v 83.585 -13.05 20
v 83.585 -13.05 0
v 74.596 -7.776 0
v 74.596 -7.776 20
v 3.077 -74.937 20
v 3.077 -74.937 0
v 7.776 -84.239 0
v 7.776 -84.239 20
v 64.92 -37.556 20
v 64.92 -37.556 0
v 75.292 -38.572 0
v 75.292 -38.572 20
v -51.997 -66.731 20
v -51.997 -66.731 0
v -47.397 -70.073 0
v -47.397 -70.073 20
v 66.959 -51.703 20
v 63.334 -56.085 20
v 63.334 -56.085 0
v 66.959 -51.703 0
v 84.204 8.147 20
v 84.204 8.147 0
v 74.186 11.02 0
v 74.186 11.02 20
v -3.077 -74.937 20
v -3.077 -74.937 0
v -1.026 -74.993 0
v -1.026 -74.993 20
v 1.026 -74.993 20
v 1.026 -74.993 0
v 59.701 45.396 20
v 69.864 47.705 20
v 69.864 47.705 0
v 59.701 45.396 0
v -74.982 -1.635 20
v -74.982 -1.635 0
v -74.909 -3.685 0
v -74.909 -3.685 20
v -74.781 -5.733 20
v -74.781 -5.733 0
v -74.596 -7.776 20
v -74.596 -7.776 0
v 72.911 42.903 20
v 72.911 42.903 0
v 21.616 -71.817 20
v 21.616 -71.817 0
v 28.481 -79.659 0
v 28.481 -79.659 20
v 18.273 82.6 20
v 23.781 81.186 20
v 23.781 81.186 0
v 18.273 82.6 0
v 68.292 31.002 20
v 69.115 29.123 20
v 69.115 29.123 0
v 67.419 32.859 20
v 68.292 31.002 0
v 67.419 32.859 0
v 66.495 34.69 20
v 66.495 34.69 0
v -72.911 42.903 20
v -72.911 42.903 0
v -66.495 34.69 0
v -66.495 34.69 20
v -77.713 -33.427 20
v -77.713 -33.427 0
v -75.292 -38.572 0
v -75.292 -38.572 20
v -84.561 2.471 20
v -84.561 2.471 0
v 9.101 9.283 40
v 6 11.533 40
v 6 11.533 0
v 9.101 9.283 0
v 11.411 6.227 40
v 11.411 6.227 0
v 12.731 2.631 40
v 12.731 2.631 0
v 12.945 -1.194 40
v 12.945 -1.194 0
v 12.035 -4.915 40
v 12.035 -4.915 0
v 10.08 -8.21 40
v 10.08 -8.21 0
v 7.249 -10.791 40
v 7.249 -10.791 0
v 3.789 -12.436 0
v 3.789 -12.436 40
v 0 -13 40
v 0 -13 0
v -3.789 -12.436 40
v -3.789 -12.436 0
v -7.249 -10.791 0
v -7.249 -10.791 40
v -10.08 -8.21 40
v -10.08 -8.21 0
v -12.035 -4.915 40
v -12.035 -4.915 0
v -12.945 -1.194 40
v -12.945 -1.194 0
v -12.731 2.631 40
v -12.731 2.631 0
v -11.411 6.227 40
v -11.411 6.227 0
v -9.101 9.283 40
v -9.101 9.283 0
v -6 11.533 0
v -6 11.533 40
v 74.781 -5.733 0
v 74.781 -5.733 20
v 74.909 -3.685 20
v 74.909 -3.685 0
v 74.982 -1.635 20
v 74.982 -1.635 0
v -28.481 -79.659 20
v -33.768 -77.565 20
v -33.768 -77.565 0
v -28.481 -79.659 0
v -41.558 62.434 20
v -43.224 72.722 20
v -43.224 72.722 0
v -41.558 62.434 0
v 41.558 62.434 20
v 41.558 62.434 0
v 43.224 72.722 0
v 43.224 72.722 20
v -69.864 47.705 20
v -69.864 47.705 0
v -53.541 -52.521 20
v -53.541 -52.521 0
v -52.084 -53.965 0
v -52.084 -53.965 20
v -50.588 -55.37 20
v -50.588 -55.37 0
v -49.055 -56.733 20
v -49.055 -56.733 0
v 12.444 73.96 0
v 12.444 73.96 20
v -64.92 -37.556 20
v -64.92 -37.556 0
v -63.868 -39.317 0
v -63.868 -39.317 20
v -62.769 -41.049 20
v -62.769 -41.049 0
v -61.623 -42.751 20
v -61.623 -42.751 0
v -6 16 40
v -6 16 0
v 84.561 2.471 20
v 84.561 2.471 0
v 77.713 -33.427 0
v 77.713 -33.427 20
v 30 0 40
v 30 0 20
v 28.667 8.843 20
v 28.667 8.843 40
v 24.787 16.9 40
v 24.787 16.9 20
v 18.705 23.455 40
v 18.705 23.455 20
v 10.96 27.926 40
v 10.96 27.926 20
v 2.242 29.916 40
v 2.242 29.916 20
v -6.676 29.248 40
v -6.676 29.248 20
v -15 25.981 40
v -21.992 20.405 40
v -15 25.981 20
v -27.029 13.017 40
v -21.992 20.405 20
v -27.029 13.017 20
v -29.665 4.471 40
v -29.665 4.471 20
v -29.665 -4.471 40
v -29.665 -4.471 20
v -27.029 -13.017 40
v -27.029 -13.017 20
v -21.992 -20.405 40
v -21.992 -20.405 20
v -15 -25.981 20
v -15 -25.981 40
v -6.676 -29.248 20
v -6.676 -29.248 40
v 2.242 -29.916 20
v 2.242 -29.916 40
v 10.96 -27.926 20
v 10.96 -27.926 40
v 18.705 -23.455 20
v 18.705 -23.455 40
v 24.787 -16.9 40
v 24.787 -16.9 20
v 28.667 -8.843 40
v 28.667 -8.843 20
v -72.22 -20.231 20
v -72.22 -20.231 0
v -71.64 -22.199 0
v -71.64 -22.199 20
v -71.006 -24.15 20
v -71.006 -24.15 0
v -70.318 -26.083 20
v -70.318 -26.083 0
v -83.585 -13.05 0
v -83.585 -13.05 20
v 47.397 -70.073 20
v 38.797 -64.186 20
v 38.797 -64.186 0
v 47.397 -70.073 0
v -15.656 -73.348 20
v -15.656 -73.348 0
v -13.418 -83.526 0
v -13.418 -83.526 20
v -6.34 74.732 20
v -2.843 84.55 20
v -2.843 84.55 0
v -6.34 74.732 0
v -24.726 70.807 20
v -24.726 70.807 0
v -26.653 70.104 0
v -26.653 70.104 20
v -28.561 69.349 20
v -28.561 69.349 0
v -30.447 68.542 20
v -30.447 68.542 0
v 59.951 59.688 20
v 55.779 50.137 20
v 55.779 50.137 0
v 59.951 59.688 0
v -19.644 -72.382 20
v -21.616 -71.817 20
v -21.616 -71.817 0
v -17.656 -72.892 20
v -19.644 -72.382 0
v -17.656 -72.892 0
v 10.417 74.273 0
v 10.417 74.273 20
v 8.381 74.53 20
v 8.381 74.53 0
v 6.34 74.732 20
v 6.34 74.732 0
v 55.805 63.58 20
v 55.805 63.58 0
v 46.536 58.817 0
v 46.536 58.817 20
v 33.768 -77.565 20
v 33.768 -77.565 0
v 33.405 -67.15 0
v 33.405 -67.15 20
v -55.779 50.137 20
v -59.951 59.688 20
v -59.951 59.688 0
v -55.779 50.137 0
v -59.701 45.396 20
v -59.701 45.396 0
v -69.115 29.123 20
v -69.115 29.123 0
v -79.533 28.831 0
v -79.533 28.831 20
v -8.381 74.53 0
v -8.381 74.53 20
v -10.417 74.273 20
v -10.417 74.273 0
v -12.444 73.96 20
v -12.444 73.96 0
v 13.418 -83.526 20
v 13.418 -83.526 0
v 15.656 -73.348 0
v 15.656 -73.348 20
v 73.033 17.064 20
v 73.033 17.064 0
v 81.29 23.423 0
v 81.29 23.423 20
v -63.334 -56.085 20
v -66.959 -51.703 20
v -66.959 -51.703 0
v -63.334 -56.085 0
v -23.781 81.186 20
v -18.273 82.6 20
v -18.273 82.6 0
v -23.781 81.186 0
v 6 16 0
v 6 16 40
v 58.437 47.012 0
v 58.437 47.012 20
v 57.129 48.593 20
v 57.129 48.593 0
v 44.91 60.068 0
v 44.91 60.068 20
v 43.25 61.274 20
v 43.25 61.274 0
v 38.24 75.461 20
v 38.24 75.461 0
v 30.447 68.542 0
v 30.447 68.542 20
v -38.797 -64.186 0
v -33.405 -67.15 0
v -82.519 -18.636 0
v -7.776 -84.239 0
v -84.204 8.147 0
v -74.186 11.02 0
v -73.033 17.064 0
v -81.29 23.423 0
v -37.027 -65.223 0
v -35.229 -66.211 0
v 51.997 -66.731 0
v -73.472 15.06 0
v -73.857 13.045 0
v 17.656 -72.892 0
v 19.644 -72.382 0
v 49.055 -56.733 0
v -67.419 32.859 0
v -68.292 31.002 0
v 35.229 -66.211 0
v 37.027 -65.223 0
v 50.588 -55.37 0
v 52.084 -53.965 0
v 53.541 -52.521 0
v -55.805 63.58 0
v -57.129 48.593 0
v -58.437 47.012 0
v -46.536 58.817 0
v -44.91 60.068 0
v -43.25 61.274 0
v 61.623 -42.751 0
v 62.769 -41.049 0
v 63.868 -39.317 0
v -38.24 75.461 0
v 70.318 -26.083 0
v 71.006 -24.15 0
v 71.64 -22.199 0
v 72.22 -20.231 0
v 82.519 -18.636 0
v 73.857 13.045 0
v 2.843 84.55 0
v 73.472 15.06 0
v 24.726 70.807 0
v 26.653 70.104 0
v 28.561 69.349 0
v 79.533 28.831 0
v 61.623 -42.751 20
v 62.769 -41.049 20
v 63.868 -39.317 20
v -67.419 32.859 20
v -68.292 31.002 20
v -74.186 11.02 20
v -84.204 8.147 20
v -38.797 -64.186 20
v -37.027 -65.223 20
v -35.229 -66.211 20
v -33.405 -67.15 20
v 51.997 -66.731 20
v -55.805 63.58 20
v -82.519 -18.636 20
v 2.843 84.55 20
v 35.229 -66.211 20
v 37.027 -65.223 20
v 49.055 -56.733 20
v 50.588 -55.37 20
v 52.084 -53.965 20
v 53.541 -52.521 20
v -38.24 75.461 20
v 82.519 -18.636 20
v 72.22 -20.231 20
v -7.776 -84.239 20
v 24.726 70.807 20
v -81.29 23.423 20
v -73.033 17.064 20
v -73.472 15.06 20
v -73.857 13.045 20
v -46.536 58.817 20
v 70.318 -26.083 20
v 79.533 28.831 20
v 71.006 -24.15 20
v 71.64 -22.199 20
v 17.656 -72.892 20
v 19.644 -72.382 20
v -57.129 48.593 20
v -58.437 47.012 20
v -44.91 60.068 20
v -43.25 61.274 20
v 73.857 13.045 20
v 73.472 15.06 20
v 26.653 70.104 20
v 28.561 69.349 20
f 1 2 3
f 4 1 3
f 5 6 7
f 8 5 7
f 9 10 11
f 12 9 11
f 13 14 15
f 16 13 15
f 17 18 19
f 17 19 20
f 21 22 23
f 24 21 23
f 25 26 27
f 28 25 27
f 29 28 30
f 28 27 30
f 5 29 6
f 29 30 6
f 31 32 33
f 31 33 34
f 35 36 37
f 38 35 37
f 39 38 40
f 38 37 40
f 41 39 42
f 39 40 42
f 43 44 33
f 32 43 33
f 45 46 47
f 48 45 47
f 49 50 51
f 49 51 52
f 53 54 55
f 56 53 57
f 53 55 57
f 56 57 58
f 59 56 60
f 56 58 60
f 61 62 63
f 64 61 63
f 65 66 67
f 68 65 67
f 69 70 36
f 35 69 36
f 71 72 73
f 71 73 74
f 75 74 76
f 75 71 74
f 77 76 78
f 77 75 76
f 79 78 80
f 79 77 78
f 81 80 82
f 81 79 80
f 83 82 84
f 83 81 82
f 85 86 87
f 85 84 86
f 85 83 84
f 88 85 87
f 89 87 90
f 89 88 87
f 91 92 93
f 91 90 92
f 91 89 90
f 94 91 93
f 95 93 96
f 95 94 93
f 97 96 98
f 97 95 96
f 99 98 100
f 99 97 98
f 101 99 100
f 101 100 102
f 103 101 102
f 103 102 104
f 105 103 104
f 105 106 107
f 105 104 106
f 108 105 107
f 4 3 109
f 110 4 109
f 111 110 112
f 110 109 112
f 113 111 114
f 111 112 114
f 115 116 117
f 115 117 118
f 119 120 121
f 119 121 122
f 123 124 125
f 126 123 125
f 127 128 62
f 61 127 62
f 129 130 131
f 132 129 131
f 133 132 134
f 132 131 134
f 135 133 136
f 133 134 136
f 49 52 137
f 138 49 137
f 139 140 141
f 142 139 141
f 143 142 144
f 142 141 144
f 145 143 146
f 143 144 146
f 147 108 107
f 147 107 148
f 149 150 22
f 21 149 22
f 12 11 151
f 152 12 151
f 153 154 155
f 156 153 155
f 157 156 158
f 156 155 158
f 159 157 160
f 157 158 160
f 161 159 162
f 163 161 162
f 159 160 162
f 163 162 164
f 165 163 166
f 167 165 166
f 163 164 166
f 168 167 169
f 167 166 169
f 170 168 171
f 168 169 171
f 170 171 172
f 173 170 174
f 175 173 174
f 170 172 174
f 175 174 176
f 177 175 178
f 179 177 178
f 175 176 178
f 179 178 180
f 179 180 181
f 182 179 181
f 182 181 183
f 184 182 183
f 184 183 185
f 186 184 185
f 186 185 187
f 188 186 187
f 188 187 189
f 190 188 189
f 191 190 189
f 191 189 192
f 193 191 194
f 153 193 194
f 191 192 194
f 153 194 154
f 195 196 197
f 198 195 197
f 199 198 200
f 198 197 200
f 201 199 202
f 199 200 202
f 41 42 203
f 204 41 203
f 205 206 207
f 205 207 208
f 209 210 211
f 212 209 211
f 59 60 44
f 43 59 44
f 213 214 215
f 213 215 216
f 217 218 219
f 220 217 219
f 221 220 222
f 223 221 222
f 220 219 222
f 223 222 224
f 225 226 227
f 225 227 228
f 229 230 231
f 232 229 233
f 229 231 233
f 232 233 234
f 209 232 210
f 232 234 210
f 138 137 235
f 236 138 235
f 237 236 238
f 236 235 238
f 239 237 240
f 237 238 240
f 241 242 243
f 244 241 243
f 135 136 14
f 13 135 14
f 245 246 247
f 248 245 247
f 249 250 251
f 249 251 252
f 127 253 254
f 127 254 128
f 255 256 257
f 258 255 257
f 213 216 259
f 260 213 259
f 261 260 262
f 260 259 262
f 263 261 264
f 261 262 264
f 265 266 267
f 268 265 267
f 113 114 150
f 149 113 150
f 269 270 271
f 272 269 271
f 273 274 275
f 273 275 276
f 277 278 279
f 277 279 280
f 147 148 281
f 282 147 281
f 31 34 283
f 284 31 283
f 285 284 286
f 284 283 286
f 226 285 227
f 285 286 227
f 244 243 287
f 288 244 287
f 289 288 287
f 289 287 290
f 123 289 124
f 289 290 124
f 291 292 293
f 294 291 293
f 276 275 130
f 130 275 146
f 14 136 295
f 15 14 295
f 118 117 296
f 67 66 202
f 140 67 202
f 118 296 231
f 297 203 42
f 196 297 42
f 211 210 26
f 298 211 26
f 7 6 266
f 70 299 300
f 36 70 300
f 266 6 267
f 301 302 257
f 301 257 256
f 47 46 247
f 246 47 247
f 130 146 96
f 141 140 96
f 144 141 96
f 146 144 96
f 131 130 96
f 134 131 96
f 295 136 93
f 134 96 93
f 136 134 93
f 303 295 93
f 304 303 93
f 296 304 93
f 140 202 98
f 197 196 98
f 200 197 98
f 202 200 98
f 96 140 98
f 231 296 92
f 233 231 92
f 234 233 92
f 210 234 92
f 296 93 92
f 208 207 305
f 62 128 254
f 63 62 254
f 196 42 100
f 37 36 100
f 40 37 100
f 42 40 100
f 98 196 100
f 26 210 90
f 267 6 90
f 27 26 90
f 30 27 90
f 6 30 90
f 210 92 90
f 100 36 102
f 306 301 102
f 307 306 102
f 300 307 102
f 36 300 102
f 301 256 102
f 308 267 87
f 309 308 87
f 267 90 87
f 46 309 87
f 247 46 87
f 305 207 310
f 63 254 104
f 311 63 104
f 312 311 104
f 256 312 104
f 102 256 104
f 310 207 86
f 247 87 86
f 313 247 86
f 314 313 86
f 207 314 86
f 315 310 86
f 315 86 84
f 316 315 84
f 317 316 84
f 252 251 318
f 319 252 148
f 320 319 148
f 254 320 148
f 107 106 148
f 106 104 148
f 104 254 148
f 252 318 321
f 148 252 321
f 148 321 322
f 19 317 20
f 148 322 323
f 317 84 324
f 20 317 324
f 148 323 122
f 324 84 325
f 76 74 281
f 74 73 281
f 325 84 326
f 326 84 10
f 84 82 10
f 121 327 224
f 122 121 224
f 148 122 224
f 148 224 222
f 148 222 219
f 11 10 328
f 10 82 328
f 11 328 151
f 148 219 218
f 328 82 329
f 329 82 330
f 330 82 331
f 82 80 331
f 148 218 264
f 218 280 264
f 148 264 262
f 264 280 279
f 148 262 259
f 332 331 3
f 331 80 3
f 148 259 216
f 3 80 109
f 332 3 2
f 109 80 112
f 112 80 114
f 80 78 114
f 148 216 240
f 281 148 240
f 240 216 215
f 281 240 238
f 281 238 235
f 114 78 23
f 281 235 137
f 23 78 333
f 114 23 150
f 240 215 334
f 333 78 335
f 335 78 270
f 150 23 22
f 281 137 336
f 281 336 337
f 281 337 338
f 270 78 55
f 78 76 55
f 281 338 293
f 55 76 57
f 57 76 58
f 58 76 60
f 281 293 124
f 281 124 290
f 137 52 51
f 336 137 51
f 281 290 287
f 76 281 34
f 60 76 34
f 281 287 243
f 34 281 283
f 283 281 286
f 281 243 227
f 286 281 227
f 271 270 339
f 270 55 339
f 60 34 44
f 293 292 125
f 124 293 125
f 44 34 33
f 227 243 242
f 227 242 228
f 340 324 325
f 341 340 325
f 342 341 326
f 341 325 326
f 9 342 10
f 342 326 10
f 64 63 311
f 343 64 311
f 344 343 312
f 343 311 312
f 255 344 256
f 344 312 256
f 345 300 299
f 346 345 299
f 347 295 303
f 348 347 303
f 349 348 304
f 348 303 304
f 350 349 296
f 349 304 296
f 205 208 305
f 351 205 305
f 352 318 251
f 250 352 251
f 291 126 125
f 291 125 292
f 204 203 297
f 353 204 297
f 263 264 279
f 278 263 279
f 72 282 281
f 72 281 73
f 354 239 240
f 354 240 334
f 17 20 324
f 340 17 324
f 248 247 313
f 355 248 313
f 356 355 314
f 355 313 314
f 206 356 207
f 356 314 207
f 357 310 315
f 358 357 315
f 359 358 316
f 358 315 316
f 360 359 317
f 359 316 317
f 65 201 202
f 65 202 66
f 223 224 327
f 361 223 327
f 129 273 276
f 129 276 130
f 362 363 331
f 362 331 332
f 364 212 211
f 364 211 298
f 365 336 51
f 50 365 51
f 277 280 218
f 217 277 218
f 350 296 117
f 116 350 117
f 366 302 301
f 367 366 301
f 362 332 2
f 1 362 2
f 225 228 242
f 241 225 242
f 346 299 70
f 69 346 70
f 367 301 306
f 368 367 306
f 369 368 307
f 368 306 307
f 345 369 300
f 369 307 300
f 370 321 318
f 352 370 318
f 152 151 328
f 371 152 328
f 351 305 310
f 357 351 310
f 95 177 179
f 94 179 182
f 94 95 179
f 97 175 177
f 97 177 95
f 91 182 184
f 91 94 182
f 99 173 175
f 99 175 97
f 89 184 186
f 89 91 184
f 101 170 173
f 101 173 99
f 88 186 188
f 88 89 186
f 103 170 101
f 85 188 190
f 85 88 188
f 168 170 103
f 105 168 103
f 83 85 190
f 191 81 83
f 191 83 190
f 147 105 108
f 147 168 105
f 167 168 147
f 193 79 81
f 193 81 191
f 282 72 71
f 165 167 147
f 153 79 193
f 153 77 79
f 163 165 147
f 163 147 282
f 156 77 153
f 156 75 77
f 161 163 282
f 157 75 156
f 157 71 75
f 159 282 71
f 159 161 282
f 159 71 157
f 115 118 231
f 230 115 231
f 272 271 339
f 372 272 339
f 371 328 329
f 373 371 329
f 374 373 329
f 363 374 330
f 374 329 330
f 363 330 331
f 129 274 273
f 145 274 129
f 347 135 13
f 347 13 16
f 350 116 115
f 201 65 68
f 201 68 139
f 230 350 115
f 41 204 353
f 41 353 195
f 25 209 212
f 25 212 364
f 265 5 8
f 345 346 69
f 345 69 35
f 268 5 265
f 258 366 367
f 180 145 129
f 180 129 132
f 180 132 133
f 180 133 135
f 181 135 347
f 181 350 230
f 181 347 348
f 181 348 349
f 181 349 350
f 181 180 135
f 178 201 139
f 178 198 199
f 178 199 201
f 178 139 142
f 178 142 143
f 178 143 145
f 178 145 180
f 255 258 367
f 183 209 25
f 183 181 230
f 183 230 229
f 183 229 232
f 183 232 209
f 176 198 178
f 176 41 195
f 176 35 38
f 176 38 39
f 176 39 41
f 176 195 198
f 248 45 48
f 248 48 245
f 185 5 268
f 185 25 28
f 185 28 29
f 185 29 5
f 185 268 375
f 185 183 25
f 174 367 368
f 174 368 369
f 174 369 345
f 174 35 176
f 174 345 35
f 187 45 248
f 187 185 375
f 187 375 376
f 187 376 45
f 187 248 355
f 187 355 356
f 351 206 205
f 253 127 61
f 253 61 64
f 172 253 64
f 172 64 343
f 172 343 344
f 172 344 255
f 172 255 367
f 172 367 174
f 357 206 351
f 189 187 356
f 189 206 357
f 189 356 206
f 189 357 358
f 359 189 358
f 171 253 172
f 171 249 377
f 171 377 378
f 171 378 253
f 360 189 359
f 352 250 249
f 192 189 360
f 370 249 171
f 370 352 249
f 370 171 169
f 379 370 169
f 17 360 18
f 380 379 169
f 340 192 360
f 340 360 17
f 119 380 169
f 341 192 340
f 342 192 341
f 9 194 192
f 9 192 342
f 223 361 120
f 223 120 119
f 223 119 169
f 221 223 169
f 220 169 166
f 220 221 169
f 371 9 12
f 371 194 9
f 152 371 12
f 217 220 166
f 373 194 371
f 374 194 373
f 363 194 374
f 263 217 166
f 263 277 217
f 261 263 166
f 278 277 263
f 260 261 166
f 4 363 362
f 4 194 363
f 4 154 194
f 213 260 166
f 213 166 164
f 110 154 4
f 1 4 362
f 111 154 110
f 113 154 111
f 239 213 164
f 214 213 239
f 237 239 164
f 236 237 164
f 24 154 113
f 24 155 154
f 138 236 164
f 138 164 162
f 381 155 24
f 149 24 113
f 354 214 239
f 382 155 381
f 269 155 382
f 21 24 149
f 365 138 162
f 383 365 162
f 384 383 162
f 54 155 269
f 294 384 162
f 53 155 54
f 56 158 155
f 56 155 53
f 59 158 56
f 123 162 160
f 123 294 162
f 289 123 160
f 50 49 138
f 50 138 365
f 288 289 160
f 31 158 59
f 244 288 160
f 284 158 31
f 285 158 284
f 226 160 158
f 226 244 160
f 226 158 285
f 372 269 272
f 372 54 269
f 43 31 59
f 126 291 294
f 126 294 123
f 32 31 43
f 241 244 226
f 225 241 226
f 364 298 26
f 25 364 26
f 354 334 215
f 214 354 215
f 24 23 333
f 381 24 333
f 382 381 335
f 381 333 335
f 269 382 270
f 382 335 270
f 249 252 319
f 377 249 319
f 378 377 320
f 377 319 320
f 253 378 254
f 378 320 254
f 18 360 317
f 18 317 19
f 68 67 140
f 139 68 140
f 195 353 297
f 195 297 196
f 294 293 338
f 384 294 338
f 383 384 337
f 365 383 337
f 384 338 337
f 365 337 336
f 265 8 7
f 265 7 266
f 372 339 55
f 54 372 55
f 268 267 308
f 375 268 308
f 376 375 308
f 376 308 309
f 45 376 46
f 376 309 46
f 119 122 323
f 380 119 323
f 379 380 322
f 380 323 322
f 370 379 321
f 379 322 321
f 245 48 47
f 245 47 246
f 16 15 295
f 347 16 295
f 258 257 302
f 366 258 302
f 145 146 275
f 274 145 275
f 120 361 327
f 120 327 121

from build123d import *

# Parameters (mm, degrees)
BOSS_EXTRUDE1_DEPTH = 20
SKETCH3_R           = 30
BOSS_EXTRUDE2_DEPTH = 20
CUT_EXTRUDE1_DEPTH  = 127.092159028


with BuildPart() as part:
    # Sketch1 → Boss-Extrude1 (new body)
    with BuildSketch(Plane.XY):
        with BuildLine():
            Line((6.339757092, 74.731569501), (2.843370149, 84.549554706))
            Line((2.843370149, 84.549554706), (-2.843370149, 84.549554706))
            Line((-2.843370149, 84.549554706), (-6.339757092, 74.731569501))
            ThreePointArc((-6.339757092, 74.731569501), (-9.399992517, 74.408602599), (-12.444403622, 73.960373299))
            Line((-12.444403622, 73.960373299), (-18.272578772, 82.600392371))
            Line((-18.272578772, 82.600392371), (-23.780659667, 81.186157568))
            Line((-23.780659667, 81.186157568), (-24.725567552, 70.807106347))
            ThreePointArc((-24.725567552, 70.807106347), (-27.609341451, 69.733236442), (-30.446636689, 68.541974836))
            Line((-30.446636689, 68.541974836), (-38.240394368, 75.4611436))
            Line((-38.240394368, 75.4611436), (-43.223722879, 72.721535567))
            Line((-43.223722879, 72.721535567), (-41.557779668, 62.433572291))
            ThreePointArc((-41.557779668, 62.433572291), (-44.083893922, 60.676274578), (-46.535795597, 58.816832014))
            Line((-46.535795597, 58.816832014), (-55.805425347, 63.58039365))
            Line((-55.805425347, 63.58039365), (-59.950880617, 59.687552036))
            Line((-59.950880617, 59.687552036), (-55.778763649, 50.137107274))
            ThreePointArc((-55.778763649, 50.137107274), (-57.788493208, 47.806799231), (-59.700939322, 45.396011323))
            Line((-59.700939322, 45.396011323), (-69.863996213, 47.704653735))
            Line((-69.863996213, 47.704653735), (-72.911104041, 42.903180095))
            Line((-72.911104041, 42.903180095), (-66.49496277, 34.690343415))
            ThreePointArc((-66.49496277, 34.690343415), (-67.862028935, 31.933446867), (-69.114853465, 29.122792286))
            Line((-69.114853465, 29.122792286), (-79.532755256, 28.83145498))
            Line((-79.532755256, 28.83145498), (-81.290054651, 23.423043562))
            Line((-81.290054651, 23.423043562), (-73.033038828, 17.063857698))
            ThreePointArc((-73.033038828, 17.063857698), (-73.671543805, 14.053598594), (-74.186027177, 11.019681104))
            Line((-74.186027177, 11.019681104), (-84.204178785, 8.146669874))
            Line((-84.204178785, 8.146669874), (-84.561252162, 2.471151058))
            Line((-84.561252162, 2.471151058), (-74.98218046, -1.634812956))
            ThreePointArc((-74.98218046, -1.634812956), (-74.852004632, -4.709288965), (-74.595819965, -7.77583717))
            Line((-74.595819965, -7.77583717), (-83.584744079, -13.050000462))
            Line((-83.584744079, -13.050000462), (-82.519155206, -18.636012955))
            Line((-82.519155206, -18.636012955), (-72.219915929, -20.230762298))
            ThreePointArc((-72.219915929, -20.230762298), (-71.329238722, -23.176274578), (-70.318483041, -26.082770996))
            Line((-70.318483041, -26.082770996), (-77.7133725, -33.426691274))
            Line((-77.7133725, -33.426691274), (-75.292076244, -38.572207736))
            Line((-75.292076244, -38.572207736), (-64.919808474, -37.555538443))
            ThreePointArc((-64.919808474, -37.555538443), (-63.324594413, -40.187009623), (-61.622777213, -42.750828396))
            Line((-61.622777213, -42.750828396), (-66.958983917, -51.703060138))
            Line((-66.958983917, -51.703060138), (-63.334119227, -56.084768847))
            Line((-63.334119227, -56.084768847), (-53.540550694, -52.520561987))
            ThreePointArc((-53.540550694, -52.520561987), (-51.341032945, -54.672647057), (-49.055085661, -56.73269402))
            Line((-49.055085661, -56.73269402), (-51.997316116, -66.730735583))
            Line((-51.997316116, -66.730735583), (-47.396646572, -70.073317665))
            Line((-47.396646572, -70.073317665), (-38.797143205, -64.185525464))
            ThreePointArc((-38.797143205, -64.185525464), (-36.131525558, -65.723001003), (-33.405082664, -67.149835831))
            Line((-33.405082664, -67.149835831), (-33.768465712, -77.565473494))
            Line((-33.768465712, -77.565473494), (-28.4810683, -79.658902223))
            Line((-28.4810683, -79.658902223), (-21.615968523, -71.817476319))
            ThreePointArc((-21.615968523, -71.817476319), (-18.651741537, -72.643737085), (-15.656115469, -73.347706497))
            Line((-15.656115469, -73.347706497), (-13.417818414, -83.526487439))
            Line((-13.417818414, -83.526487439), (-7.775919761, -84.239224989))
            Line((-7.775919761, -84.239224989), (-3.076583041, -74.93687101))
            ThreePointArc((-3.076583041, -74.93687101), (0, -75), (3.076583041, -74.93687101))
            Line((3.076583041, -74.93687101), (7.775919761, -84.239224989))
            Line((7.775919761, -84.239224989), (13.417818414, -83.526487439))
            Line((13.417818414, -83.526487439), (15.656115469, -73.347706497))
            ThreePointArc((15.656115469, -73.347706497), (18.651741537, -72.643737085), (21.615968523, -71.817476319))
            Line((21.615968523, -71.817476319), (28.4810683, -79.658902223))
            Line((28.4810683, -79.658902223), (33.768465712, -77.565473494))
            Line((33.768465712, -77.565473494), (33.405082664, -67.149835831))
            ThreePointArc((33.405082664, -67.149835831), (36.131525558, -65.723001003), (38.797143205, -64.185525464))
            Line((38.797143205, -64.185525464), (47.396646572, -70.073317665))
            Line((47.396646572, -70.073317665), (51.997316116, -66.730735583))
            Line((51.997316116, -66.730735583), (49.055085661, -56.73269402))
            ThreePointArc((49.055085661, -56.73269402), (51.341032945, -54.672647057), (53.540550694, -52.520561987))
            Line((53.540550694, -52.520561987), (63.334119227, -56.084768847))
            Line((63.334119227, -56.084768847), (66.958983917, -51.703060138))
            Line((66.958983917, -51.703060138), (61.622777213, -42.750828396))
            ThreePointArc((61.622777213, -42.750828396), (63.324594413, -40.187009623), (64.919808474, -37.555538443))
            Line((64.919808474, -37.555538443), (75.292076244, -38.572207736))
            Line((75.292076244, -38.572207736), (77.7133725, -33.426691274))
            Line((77.7133725, -33.426691274), (70.318483041, -26.082770996))
            ThreePointArc((70.318483041, -26.082770996), (71.329238722, -23.176274578), (72.219915929, -20.230762298))
            Line((72.219915929, -20.230762298), (82.519155206, -18.636012955))
            Line((82.519155206, -18.636012955), (83.584744079, -13.050000462))
            Line((83.584744079, -13.050000462), (74.595819965, -7.77583717))
            ThreePointArc((74.595819965, -7.77583717), (74.852004632, -4.709288965), (74.98218046, -1.634812956))
            Line((74.98218046, -1.634812956), (84.561252162, 2.471151058))
            Line((84.561252162, 2.471151058), (84.204178785, 8.146669874))
            Line((84.204178785, 8.146669874), (74.186027177, 11.019681104))
            ThreePointArc((74.186027177, 11.019681104), (73.671543805, 14.053598594), (73.033038828, 17.063857698))
            Line((73.033038828, 17.063857698), (81.290054651, 23.423043562))
            Line((81.290054651, 23.423043562), (79.532755256, 28.83145498))
            Line((79.532755256, 28.83145498), (69.114853465, 29.122792286))
            ThreePointArc((69.114853465, 29.122792286), (67.862028935, 31.933446867), (66.49496277, 34.690343415))
            Line((66.49496277, 34.690343415), (72.911104041, 42.903180095))
            Line((72.911104041, 42.903180095), (69.863996213, 47.704653735))
            Line((69.863996213, 47.704653735), (59.700939322, 45.396011323))
            ThreePointArc((59.700939322, 45.396011323), (57.788493208, 47.806799231), (55.778763649, 50.137107274))
            Line((55.778763649, 50.137107274), (59.950880617, 59.687552036))
            Line((59.950880617, 59.687552036), (55.805425347, 63.58039365))
            Line((55.805425347, 63.58039365), (46.535795597, 58.816832014))
            ThreePointArc((46.535795597, 58.816832014), (44.083893922, 60.676274578), (41.557779668, 62.433572291))
            Line((41.557779668, 62.433572291), (43.223722879, 72.721535567))
            Line((43.223722879, 72.721535567), (38.240394368, 75.4611436))
            Line((38.240394368, 75.4611436), (30.446636689, 68.541974836))
            ThreePointArc((30.446636689, 68.541974836), (27.609341451, 69.733236442), (24.725567552, 70.807106347))
            Line((24.725567552, 70.807106347), (23.780659667, 81.186157568))
            Line((23.780659667, 81.186157568), (18.272578772, 82.600392371))
            Line((18.272578772, 82.600392371), (12.444403622, 73.960373299))
            ThreePointArc((12.444403622, 73.960373299), (9.399992517, 74.408602599), (6.339757092, 74.731569501))
        make_face()
    extrude(amount=BOSS_EXTRUDE1_DEPTH)

    # Sketch3 → Boss-Extrude2 (add)
    with BuildSketch(Plane.XY.offset(20)):
        Circle(SKETCH3_R)
    extrude(amount=BOSS_EXTRUDE2_DEPTH)

    # Sketch4 → Cut-Extrude1 (cut, through all)
    with BuildSketch(Plane.XY.offset(40)):
        with BuildLine():
            Line((-6, 16), (6, 16))
            Line((6, 16), (6, 11.532562595))
            ThreePointArc((6, 11.532562595), (0, -13), (-6, 11.532562595))
            Line((-6, 11.532562595), (-6, 16))
        make_face()
    extrude(amount=-CUT_EXTRUDE1_DEPTH, mode=Mode.SUBTRACT)


solid = part.part
